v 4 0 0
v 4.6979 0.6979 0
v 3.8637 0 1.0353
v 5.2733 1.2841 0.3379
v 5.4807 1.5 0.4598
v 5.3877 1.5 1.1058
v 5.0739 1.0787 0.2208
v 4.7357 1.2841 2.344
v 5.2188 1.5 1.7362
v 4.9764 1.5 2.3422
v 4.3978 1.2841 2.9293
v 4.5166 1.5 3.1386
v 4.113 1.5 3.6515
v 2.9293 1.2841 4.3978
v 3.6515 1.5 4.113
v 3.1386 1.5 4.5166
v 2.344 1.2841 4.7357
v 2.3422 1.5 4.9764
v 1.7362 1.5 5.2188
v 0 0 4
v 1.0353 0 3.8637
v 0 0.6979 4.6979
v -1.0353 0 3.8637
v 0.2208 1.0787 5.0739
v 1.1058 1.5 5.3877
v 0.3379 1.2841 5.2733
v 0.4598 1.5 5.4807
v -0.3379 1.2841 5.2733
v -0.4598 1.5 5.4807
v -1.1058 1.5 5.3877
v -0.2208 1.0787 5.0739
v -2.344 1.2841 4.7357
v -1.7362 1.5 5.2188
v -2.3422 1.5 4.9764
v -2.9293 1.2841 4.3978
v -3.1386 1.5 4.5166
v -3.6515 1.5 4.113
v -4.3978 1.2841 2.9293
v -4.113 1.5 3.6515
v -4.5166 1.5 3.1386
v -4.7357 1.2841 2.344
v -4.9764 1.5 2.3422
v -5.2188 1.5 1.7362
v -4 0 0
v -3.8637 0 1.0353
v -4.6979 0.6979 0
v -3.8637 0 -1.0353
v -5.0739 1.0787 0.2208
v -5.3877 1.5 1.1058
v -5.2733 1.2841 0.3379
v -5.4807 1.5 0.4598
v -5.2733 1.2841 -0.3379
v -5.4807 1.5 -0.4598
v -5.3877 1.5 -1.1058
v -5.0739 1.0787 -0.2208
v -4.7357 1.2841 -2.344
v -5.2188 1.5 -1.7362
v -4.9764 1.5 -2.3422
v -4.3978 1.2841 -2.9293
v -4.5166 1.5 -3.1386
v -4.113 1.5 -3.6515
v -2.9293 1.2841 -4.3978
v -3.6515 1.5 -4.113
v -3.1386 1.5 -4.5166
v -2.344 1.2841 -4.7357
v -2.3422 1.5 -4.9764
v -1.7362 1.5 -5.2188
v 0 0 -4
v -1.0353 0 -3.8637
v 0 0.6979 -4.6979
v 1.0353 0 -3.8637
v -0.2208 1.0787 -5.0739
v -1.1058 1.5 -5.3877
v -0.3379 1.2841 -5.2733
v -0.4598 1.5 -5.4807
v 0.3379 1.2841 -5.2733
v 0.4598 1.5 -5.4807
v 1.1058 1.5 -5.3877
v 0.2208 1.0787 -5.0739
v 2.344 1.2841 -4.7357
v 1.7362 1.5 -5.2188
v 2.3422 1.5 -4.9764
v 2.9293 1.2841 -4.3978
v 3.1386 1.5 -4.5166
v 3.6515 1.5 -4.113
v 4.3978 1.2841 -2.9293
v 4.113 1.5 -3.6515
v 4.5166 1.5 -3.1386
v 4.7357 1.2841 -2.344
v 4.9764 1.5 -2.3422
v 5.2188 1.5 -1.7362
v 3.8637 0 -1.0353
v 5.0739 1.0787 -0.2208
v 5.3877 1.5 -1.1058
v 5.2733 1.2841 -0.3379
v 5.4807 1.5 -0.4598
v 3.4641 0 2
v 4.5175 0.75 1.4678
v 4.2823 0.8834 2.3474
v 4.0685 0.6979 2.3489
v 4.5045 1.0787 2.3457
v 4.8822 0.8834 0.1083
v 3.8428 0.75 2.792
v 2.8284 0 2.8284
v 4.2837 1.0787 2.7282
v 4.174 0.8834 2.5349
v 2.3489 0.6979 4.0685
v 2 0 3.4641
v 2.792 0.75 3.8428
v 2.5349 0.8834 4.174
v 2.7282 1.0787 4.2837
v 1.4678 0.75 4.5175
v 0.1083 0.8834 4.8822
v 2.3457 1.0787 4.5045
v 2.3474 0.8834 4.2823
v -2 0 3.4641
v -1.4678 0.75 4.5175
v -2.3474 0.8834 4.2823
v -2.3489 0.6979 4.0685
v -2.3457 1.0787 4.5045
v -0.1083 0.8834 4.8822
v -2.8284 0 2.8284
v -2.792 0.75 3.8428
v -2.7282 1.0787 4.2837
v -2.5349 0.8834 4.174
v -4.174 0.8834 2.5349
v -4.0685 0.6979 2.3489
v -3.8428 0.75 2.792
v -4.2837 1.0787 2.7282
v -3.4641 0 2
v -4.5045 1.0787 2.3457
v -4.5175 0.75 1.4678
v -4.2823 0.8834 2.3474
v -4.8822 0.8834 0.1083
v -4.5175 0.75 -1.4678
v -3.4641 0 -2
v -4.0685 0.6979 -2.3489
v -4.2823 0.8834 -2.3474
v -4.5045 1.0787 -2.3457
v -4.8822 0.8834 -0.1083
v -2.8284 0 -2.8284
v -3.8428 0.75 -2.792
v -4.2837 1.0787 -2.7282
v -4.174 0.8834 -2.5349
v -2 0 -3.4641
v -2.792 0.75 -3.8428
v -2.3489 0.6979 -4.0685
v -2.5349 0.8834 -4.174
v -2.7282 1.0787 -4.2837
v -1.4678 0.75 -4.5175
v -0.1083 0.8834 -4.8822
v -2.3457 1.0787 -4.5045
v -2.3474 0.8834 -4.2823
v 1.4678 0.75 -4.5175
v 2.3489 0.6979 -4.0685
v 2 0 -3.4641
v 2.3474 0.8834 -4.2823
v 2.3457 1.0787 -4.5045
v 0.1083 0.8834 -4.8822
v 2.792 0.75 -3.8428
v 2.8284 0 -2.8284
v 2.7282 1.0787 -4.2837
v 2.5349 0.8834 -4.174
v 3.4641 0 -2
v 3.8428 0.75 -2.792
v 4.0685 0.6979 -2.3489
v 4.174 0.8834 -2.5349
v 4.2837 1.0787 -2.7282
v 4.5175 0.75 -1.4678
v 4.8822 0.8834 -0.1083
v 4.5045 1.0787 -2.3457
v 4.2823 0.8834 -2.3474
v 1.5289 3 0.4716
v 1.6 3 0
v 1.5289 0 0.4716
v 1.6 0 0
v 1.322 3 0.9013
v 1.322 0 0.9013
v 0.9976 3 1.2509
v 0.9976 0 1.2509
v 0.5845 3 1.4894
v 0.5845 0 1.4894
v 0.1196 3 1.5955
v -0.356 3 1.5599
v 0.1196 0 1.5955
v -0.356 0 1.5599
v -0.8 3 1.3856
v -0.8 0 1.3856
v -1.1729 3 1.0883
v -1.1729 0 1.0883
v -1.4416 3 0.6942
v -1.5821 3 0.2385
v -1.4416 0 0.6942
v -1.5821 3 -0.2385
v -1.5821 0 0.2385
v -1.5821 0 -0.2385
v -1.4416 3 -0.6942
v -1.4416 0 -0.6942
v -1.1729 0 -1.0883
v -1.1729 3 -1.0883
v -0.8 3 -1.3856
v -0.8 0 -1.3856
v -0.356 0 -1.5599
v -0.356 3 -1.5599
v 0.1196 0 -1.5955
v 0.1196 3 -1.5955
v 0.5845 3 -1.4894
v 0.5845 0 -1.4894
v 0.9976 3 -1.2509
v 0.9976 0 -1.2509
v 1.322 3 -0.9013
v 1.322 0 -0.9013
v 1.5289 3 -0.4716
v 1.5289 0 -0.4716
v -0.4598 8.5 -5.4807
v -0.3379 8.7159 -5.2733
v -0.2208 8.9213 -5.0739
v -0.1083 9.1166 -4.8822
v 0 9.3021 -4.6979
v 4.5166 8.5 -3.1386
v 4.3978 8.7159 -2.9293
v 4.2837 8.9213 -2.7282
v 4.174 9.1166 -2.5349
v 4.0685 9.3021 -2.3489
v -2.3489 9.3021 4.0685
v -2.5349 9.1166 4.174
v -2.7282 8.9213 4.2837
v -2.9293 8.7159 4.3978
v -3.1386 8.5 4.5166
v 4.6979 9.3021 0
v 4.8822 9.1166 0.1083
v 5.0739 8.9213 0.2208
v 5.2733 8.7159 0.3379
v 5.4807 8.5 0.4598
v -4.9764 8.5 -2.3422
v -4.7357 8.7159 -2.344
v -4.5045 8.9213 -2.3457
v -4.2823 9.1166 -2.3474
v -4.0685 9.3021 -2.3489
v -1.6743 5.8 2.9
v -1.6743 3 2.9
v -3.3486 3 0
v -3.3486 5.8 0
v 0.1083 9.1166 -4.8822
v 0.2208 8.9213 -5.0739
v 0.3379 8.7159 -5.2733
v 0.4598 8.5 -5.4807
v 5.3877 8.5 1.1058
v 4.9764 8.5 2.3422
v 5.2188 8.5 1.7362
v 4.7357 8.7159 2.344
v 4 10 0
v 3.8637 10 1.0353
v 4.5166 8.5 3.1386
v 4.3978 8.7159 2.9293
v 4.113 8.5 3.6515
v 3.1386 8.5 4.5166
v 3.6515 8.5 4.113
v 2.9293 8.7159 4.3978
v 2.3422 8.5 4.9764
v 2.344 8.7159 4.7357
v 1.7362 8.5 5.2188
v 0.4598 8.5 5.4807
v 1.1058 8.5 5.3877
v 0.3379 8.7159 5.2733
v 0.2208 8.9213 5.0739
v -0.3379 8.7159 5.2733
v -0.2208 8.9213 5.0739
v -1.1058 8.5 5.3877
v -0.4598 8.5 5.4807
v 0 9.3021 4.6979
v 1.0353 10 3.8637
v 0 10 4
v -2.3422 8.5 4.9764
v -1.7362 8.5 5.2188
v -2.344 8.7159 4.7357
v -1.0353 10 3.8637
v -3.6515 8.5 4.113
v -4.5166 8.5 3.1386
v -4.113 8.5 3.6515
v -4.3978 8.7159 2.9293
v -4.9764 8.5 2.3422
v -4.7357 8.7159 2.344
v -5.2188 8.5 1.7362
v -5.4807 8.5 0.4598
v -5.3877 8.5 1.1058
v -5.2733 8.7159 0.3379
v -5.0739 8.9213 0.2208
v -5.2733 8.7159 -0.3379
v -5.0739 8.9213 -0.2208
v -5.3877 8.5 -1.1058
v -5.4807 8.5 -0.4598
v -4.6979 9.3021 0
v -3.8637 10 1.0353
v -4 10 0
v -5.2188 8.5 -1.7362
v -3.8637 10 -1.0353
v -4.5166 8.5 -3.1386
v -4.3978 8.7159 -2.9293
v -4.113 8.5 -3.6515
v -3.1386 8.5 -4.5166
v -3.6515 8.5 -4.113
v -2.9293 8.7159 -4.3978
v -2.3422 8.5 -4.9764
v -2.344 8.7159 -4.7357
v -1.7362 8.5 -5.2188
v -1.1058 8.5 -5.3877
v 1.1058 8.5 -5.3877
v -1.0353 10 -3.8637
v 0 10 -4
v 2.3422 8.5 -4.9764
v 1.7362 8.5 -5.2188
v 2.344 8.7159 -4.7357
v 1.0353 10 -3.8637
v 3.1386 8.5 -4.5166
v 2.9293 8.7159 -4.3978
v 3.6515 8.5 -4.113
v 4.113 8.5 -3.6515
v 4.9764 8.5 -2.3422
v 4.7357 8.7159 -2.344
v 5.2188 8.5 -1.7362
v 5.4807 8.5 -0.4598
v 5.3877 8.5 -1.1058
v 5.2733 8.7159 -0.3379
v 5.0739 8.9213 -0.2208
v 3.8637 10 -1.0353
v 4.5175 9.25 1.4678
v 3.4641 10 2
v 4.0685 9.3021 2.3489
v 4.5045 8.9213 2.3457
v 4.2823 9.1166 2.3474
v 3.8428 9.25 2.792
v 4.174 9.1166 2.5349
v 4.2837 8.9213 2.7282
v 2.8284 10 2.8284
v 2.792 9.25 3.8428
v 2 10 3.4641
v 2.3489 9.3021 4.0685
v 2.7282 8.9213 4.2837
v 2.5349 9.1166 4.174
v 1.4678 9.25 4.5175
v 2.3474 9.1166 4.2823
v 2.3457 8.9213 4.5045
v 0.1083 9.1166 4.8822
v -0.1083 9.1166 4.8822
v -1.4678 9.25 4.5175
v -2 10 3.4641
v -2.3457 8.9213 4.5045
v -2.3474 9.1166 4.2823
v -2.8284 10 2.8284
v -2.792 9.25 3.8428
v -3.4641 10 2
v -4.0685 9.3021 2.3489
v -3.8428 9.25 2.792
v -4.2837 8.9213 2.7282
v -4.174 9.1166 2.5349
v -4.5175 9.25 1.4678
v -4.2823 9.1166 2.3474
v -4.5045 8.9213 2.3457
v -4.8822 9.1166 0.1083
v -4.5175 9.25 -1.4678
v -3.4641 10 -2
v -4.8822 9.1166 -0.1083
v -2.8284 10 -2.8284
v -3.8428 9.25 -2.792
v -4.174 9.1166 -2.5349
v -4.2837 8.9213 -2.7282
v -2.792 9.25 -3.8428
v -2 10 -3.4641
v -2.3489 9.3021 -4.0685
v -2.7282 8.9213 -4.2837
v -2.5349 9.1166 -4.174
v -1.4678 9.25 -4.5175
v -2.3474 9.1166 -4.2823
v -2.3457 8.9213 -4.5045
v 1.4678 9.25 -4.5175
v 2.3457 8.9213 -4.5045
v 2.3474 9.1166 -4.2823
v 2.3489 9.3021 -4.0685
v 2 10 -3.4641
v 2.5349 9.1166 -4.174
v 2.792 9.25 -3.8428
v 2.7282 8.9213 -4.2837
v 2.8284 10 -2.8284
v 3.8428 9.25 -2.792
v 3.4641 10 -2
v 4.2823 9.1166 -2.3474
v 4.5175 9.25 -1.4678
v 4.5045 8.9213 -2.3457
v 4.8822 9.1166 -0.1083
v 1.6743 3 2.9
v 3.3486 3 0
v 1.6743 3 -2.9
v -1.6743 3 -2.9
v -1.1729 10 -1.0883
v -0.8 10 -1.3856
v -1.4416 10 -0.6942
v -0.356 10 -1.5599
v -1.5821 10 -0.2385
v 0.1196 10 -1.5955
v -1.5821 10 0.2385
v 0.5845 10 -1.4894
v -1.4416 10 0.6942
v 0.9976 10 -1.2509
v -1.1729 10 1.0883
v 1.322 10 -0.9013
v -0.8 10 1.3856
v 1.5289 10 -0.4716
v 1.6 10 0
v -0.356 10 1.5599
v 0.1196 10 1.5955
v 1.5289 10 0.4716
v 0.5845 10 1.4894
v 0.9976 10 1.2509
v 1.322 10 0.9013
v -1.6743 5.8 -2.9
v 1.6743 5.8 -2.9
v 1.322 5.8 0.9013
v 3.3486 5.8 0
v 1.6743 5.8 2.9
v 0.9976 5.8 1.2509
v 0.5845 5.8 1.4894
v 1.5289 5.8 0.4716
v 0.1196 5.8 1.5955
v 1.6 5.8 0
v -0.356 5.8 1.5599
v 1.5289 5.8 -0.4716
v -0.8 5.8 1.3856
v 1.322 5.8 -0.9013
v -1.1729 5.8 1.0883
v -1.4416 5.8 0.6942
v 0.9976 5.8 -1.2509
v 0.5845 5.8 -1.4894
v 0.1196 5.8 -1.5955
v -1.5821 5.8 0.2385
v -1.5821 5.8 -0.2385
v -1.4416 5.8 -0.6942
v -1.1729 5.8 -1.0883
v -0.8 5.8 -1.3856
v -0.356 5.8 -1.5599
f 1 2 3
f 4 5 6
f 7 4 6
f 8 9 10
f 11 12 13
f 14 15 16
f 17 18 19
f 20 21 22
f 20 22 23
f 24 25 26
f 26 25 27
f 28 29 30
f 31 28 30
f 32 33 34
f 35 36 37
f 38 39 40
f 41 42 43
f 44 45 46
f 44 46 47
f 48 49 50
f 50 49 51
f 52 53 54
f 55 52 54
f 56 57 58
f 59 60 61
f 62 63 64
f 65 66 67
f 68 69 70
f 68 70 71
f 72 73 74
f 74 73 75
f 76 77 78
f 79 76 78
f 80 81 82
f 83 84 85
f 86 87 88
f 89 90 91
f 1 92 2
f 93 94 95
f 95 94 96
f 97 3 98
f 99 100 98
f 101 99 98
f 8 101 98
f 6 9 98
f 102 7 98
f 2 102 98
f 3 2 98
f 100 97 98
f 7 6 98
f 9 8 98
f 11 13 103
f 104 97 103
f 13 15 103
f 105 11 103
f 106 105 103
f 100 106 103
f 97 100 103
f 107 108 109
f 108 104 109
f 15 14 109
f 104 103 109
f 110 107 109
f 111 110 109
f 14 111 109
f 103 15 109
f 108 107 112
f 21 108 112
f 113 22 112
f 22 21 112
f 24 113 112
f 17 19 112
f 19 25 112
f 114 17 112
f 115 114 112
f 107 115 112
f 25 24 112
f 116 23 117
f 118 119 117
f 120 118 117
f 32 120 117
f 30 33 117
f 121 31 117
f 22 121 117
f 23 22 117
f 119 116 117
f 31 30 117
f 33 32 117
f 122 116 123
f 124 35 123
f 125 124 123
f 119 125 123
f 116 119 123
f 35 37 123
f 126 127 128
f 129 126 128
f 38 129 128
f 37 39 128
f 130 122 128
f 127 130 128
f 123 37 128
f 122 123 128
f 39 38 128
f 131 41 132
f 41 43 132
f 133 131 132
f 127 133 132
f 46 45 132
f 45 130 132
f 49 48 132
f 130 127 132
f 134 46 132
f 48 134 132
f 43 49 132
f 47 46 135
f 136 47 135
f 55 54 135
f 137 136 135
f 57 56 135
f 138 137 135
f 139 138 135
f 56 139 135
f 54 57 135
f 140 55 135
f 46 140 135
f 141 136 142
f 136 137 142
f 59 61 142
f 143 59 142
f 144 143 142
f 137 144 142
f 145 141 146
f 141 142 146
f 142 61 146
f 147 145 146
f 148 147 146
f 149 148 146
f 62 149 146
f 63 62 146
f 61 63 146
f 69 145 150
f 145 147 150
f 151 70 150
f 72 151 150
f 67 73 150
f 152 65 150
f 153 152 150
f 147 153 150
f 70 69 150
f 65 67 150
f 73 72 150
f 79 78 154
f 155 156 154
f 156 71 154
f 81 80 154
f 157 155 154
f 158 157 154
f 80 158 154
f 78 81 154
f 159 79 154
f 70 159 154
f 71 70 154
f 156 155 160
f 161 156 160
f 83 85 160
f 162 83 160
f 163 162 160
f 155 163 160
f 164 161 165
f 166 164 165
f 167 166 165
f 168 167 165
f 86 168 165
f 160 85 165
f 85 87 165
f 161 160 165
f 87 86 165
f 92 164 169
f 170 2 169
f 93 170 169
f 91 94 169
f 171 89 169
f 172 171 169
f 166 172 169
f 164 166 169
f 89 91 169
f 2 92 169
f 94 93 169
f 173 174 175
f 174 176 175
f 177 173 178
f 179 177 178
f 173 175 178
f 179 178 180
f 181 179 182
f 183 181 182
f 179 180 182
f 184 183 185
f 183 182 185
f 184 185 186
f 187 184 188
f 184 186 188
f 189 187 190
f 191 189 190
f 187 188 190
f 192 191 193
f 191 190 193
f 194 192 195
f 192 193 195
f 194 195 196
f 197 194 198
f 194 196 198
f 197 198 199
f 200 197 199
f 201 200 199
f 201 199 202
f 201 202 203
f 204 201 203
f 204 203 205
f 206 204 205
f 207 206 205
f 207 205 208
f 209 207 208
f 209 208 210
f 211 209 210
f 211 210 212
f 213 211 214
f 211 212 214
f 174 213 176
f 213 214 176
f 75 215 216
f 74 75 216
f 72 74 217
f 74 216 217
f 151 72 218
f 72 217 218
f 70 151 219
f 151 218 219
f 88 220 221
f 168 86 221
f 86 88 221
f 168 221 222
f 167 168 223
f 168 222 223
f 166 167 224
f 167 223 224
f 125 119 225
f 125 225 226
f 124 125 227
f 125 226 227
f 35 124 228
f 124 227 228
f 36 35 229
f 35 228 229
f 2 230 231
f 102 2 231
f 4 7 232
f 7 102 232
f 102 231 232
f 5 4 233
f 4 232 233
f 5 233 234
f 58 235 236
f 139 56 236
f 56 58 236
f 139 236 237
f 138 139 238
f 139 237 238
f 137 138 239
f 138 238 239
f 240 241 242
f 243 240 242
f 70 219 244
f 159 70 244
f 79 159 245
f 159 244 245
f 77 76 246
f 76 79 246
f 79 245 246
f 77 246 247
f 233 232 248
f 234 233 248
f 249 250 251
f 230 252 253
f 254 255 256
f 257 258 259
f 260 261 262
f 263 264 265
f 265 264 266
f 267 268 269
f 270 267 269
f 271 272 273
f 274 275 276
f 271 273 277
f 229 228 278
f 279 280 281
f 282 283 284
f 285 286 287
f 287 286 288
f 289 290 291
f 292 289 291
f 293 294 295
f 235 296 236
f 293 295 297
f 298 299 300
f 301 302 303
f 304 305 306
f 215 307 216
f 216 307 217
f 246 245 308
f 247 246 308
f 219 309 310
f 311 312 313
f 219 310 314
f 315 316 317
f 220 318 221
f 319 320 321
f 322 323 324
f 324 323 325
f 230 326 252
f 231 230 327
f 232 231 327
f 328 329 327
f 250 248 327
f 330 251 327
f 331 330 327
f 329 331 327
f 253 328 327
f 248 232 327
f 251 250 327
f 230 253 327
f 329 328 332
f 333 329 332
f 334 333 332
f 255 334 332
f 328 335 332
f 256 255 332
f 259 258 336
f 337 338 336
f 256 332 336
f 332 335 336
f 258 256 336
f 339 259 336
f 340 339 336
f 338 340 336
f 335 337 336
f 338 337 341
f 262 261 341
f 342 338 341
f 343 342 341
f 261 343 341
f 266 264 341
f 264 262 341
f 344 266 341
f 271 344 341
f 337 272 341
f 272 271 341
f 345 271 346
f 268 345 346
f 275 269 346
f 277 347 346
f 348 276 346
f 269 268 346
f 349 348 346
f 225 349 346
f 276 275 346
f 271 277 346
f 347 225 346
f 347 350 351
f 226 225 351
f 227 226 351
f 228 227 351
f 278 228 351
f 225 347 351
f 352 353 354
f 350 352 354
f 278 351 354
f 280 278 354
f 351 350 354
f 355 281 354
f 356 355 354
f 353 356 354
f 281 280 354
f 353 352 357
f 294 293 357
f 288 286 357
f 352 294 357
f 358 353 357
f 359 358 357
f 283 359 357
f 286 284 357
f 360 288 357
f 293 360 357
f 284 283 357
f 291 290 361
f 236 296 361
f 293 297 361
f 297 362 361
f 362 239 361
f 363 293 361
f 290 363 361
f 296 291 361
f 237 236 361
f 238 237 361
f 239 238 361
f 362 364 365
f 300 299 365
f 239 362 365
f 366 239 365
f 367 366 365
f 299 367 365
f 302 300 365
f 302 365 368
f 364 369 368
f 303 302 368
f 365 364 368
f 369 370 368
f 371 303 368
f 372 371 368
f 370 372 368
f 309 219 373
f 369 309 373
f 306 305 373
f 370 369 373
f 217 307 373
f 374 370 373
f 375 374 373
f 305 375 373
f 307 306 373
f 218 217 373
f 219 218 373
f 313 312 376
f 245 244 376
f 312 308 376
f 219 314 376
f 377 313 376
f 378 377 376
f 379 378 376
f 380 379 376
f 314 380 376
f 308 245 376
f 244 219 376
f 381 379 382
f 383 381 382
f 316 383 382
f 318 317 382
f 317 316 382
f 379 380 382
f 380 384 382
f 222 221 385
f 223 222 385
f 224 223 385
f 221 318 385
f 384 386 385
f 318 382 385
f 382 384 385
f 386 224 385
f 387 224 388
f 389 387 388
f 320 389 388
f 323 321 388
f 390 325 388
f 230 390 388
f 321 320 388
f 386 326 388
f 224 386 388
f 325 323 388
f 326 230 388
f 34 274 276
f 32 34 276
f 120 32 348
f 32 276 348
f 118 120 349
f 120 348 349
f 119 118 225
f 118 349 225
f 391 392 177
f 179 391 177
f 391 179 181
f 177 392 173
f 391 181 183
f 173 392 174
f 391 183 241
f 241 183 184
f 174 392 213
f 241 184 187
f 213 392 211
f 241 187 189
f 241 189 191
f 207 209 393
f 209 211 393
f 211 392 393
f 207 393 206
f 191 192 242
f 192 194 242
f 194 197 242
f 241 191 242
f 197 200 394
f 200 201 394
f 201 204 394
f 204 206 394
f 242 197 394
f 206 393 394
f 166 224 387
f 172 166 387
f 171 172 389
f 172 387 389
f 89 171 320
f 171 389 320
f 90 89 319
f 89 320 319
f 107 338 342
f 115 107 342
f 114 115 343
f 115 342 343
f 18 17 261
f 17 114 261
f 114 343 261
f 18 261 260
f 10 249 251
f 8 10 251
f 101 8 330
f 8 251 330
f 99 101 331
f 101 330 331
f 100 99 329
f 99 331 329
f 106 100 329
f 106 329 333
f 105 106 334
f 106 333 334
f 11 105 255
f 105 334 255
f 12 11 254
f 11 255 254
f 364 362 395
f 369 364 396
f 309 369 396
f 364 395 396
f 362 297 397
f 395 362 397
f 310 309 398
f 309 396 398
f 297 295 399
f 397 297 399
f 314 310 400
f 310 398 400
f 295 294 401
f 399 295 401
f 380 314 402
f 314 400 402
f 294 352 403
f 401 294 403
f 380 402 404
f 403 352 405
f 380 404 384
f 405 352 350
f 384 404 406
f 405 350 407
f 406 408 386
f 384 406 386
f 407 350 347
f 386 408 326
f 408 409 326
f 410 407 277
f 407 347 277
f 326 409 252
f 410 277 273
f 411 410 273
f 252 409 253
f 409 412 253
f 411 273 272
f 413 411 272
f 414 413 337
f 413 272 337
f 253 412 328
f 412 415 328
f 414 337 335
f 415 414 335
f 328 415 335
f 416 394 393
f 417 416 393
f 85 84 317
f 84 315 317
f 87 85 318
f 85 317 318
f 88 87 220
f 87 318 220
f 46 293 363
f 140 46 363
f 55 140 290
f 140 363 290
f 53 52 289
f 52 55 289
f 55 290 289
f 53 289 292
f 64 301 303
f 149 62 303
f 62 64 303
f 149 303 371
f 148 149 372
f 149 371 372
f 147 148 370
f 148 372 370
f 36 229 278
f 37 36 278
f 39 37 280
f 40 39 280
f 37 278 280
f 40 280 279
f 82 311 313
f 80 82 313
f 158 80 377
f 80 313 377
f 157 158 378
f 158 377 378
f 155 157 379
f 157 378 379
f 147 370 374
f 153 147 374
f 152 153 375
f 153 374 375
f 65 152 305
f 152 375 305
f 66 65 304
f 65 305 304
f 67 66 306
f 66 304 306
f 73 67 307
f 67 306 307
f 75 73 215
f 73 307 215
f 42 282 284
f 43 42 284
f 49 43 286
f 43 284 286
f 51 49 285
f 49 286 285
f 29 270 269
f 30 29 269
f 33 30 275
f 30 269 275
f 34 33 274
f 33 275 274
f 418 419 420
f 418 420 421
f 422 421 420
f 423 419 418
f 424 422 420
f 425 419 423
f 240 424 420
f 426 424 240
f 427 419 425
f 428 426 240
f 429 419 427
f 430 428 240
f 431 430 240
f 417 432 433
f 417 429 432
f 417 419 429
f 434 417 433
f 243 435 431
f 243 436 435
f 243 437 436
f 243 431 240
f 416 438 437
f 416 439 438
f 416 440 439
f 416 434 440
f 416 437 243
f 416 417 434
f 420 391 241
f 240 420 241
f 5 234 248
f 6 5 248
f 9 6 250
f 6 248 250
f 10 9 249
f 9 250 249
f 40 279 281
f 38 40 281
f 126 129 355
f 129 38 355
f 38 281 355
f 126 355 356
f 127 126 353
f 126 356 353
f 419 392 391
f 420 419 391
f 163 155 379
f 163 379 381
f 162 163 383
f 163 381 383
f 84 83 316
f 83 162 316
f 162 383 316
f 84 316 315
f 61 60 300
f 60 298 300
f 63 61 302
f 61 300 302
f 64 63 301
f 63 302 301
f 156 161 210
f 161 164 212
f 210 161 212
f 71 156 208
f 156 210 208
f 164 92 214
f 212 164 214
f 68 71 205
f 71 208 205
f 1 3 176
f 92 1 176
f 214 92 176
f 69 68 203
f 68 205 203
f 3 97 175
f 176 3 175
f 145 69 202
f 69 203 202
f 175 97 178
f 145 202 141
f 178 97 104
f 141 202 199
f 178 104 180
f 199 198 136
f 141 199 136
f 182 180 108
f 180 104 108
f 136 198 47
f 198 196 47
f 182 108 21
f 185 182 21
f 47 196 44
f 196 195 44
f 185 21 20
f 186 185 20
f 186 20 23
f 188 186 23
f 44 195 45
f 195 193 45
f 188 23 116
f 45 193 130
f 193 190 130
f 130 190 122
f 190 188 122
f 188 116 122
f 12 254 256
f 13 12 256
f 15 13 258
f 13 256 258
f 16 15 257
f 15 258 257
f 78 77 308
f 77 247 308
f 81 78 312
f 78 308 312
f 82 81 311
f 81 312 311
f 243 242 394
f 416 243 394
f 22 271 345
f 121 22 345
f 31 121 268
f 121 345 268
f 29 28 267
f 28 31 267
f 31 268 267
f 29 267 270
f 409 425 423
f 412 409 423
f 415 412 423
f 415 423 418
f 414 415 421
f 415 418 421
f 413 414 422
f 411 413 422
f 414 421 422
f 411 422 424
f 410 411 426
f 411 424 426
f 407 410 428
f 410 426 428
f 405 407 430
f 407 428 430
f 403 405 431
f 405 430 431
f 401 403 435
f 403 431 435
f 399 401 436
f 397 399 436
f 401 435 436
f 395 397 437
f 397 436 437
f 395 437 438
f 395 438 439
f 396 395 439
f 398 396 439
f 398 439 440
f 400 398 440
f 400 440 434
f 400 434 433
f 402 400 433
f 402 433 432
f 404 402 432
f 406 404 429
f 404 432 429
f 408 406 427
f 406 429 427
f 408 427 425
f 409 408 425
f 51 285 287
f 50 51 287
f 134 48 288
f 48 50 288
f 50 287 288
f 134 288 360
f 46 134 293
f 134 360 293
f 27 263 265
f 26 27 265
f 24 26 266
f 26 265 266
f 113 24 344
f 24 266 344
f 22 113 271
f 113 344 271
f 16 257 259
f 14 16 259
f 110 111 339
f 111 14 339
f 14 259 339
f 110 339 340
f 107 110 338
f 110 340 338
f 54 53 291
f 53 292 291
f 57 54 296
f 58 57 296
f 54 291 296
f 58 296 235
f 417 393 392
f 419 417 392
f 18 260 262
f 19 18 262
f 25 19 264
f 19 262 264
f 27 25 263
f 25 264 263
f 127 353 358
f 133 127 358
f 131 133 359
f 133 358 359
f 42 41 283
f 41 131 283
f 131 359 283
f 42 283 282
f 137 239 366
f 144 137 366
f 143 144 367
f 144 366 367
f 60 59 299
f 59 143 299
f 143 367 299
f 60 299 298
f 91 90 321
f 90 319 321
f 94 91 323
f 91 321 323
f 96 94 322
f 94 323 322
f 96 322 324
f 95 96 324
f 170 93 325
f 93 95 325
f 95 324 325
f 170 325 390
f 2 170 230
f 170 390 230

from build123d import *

# Parameters (mm, degrees)
CUT_EXTRUDE1_DEPTH = 11
CUT_EXTRUDE2_DEPTH = 2.8


with BuildPart() as part:
    # Sketch1 → Revolve1 (revolve)
    with BuildSketch(Plane.XY):
        Polygon((1.6, 0), (4, 0), (5.5, 1.5), (5.5, 8.5), (4, 10), (1.6, 10), align=None)
    revolve(axis=Axis((0, 9.5, 0), (0, -1, 0)))

    # Sketch2 → Cut-Extrude1 (cut, through all)
    with BuildSketch(Plane(origin=(0, 10, 0), x_dir=(1, 0, 0), z_dir=(0, 1, 0))):
        Polygon((-0.849983323, 6.145149701), (0, 4.697880799), (0.849983323, 6.145149701), align=None)
        Polygon((3.808682001, 4.896864089), (2.3364677, 5.746847412), (2.3489404, 4.068484116), align=None)
        Polygon((5.746847412, 2.3364677), (4.896864089, 3.808682001), (4.068484116, 2.3489404), align=None)
        Polygon((6.145149701, -0.849983323), (6.145149701, 0.849983323), (4.697880799, 0), align=None)
        Polygon((4.896864089, -3.808682001), (5.746847412, -2.3364677), (4.068484116, -2.3489404), align=None)
        Polygon((2.3364677, -5.746847412), (3.808682001, -4.896864089), (2.3489404, -4.068484116), align=None)
        Polygon((-0.849983323, -6.145149701), (0.849983323, -6.145149701), (0, -4.697880799), align=None)
        Polygon((-3.808682001, -4.896864089), (-2.3364677, -5.746847412), (-2.3489404, -4.068484116), align=None)
        Polygon((-5.746847412, -2.3364677), (-4.896864089, -3.808682001), (-4.068484116, -2.3489404), align=None)
        Polygon((-6.145149701, 0.849983323), (-6.145149701, -0.849983323), (-4.697880799, 0), align=None)
        Polygon((-4.896864089, 3.808682001), (-5.746847412, 2.3364677), (-4.068484116, 2.3489404), align=None)
        Polygon((-2.3364677, 5.746847412), (-3.808682001, 4.896864089), (-2.3489404, 4.068484116), align=None)
    extrude(amount=-CUT_EXTRUDE1_DEPTH, mode=Mode.SUBTRACT)

    # Sketch3 → Cut-Extrude2 (cut)
    with BuildSketch(Plane(origin=(0, 3, 0), x_dir=(-1, 0, 0), z_dir=(0, -1, 0))):
        Polygon((1.674315781, 2.9), (-1.674315781, 2.9), (-3.348631561, 0), (-1.674315781, -2.9), (1.674315781, -2.9), (3.348631561, 0), align=None)
    extrude(amount=-CUT_EXTRUDE2_DEPTH, mode=Mode.SUBTRACT)


solid = part.part
